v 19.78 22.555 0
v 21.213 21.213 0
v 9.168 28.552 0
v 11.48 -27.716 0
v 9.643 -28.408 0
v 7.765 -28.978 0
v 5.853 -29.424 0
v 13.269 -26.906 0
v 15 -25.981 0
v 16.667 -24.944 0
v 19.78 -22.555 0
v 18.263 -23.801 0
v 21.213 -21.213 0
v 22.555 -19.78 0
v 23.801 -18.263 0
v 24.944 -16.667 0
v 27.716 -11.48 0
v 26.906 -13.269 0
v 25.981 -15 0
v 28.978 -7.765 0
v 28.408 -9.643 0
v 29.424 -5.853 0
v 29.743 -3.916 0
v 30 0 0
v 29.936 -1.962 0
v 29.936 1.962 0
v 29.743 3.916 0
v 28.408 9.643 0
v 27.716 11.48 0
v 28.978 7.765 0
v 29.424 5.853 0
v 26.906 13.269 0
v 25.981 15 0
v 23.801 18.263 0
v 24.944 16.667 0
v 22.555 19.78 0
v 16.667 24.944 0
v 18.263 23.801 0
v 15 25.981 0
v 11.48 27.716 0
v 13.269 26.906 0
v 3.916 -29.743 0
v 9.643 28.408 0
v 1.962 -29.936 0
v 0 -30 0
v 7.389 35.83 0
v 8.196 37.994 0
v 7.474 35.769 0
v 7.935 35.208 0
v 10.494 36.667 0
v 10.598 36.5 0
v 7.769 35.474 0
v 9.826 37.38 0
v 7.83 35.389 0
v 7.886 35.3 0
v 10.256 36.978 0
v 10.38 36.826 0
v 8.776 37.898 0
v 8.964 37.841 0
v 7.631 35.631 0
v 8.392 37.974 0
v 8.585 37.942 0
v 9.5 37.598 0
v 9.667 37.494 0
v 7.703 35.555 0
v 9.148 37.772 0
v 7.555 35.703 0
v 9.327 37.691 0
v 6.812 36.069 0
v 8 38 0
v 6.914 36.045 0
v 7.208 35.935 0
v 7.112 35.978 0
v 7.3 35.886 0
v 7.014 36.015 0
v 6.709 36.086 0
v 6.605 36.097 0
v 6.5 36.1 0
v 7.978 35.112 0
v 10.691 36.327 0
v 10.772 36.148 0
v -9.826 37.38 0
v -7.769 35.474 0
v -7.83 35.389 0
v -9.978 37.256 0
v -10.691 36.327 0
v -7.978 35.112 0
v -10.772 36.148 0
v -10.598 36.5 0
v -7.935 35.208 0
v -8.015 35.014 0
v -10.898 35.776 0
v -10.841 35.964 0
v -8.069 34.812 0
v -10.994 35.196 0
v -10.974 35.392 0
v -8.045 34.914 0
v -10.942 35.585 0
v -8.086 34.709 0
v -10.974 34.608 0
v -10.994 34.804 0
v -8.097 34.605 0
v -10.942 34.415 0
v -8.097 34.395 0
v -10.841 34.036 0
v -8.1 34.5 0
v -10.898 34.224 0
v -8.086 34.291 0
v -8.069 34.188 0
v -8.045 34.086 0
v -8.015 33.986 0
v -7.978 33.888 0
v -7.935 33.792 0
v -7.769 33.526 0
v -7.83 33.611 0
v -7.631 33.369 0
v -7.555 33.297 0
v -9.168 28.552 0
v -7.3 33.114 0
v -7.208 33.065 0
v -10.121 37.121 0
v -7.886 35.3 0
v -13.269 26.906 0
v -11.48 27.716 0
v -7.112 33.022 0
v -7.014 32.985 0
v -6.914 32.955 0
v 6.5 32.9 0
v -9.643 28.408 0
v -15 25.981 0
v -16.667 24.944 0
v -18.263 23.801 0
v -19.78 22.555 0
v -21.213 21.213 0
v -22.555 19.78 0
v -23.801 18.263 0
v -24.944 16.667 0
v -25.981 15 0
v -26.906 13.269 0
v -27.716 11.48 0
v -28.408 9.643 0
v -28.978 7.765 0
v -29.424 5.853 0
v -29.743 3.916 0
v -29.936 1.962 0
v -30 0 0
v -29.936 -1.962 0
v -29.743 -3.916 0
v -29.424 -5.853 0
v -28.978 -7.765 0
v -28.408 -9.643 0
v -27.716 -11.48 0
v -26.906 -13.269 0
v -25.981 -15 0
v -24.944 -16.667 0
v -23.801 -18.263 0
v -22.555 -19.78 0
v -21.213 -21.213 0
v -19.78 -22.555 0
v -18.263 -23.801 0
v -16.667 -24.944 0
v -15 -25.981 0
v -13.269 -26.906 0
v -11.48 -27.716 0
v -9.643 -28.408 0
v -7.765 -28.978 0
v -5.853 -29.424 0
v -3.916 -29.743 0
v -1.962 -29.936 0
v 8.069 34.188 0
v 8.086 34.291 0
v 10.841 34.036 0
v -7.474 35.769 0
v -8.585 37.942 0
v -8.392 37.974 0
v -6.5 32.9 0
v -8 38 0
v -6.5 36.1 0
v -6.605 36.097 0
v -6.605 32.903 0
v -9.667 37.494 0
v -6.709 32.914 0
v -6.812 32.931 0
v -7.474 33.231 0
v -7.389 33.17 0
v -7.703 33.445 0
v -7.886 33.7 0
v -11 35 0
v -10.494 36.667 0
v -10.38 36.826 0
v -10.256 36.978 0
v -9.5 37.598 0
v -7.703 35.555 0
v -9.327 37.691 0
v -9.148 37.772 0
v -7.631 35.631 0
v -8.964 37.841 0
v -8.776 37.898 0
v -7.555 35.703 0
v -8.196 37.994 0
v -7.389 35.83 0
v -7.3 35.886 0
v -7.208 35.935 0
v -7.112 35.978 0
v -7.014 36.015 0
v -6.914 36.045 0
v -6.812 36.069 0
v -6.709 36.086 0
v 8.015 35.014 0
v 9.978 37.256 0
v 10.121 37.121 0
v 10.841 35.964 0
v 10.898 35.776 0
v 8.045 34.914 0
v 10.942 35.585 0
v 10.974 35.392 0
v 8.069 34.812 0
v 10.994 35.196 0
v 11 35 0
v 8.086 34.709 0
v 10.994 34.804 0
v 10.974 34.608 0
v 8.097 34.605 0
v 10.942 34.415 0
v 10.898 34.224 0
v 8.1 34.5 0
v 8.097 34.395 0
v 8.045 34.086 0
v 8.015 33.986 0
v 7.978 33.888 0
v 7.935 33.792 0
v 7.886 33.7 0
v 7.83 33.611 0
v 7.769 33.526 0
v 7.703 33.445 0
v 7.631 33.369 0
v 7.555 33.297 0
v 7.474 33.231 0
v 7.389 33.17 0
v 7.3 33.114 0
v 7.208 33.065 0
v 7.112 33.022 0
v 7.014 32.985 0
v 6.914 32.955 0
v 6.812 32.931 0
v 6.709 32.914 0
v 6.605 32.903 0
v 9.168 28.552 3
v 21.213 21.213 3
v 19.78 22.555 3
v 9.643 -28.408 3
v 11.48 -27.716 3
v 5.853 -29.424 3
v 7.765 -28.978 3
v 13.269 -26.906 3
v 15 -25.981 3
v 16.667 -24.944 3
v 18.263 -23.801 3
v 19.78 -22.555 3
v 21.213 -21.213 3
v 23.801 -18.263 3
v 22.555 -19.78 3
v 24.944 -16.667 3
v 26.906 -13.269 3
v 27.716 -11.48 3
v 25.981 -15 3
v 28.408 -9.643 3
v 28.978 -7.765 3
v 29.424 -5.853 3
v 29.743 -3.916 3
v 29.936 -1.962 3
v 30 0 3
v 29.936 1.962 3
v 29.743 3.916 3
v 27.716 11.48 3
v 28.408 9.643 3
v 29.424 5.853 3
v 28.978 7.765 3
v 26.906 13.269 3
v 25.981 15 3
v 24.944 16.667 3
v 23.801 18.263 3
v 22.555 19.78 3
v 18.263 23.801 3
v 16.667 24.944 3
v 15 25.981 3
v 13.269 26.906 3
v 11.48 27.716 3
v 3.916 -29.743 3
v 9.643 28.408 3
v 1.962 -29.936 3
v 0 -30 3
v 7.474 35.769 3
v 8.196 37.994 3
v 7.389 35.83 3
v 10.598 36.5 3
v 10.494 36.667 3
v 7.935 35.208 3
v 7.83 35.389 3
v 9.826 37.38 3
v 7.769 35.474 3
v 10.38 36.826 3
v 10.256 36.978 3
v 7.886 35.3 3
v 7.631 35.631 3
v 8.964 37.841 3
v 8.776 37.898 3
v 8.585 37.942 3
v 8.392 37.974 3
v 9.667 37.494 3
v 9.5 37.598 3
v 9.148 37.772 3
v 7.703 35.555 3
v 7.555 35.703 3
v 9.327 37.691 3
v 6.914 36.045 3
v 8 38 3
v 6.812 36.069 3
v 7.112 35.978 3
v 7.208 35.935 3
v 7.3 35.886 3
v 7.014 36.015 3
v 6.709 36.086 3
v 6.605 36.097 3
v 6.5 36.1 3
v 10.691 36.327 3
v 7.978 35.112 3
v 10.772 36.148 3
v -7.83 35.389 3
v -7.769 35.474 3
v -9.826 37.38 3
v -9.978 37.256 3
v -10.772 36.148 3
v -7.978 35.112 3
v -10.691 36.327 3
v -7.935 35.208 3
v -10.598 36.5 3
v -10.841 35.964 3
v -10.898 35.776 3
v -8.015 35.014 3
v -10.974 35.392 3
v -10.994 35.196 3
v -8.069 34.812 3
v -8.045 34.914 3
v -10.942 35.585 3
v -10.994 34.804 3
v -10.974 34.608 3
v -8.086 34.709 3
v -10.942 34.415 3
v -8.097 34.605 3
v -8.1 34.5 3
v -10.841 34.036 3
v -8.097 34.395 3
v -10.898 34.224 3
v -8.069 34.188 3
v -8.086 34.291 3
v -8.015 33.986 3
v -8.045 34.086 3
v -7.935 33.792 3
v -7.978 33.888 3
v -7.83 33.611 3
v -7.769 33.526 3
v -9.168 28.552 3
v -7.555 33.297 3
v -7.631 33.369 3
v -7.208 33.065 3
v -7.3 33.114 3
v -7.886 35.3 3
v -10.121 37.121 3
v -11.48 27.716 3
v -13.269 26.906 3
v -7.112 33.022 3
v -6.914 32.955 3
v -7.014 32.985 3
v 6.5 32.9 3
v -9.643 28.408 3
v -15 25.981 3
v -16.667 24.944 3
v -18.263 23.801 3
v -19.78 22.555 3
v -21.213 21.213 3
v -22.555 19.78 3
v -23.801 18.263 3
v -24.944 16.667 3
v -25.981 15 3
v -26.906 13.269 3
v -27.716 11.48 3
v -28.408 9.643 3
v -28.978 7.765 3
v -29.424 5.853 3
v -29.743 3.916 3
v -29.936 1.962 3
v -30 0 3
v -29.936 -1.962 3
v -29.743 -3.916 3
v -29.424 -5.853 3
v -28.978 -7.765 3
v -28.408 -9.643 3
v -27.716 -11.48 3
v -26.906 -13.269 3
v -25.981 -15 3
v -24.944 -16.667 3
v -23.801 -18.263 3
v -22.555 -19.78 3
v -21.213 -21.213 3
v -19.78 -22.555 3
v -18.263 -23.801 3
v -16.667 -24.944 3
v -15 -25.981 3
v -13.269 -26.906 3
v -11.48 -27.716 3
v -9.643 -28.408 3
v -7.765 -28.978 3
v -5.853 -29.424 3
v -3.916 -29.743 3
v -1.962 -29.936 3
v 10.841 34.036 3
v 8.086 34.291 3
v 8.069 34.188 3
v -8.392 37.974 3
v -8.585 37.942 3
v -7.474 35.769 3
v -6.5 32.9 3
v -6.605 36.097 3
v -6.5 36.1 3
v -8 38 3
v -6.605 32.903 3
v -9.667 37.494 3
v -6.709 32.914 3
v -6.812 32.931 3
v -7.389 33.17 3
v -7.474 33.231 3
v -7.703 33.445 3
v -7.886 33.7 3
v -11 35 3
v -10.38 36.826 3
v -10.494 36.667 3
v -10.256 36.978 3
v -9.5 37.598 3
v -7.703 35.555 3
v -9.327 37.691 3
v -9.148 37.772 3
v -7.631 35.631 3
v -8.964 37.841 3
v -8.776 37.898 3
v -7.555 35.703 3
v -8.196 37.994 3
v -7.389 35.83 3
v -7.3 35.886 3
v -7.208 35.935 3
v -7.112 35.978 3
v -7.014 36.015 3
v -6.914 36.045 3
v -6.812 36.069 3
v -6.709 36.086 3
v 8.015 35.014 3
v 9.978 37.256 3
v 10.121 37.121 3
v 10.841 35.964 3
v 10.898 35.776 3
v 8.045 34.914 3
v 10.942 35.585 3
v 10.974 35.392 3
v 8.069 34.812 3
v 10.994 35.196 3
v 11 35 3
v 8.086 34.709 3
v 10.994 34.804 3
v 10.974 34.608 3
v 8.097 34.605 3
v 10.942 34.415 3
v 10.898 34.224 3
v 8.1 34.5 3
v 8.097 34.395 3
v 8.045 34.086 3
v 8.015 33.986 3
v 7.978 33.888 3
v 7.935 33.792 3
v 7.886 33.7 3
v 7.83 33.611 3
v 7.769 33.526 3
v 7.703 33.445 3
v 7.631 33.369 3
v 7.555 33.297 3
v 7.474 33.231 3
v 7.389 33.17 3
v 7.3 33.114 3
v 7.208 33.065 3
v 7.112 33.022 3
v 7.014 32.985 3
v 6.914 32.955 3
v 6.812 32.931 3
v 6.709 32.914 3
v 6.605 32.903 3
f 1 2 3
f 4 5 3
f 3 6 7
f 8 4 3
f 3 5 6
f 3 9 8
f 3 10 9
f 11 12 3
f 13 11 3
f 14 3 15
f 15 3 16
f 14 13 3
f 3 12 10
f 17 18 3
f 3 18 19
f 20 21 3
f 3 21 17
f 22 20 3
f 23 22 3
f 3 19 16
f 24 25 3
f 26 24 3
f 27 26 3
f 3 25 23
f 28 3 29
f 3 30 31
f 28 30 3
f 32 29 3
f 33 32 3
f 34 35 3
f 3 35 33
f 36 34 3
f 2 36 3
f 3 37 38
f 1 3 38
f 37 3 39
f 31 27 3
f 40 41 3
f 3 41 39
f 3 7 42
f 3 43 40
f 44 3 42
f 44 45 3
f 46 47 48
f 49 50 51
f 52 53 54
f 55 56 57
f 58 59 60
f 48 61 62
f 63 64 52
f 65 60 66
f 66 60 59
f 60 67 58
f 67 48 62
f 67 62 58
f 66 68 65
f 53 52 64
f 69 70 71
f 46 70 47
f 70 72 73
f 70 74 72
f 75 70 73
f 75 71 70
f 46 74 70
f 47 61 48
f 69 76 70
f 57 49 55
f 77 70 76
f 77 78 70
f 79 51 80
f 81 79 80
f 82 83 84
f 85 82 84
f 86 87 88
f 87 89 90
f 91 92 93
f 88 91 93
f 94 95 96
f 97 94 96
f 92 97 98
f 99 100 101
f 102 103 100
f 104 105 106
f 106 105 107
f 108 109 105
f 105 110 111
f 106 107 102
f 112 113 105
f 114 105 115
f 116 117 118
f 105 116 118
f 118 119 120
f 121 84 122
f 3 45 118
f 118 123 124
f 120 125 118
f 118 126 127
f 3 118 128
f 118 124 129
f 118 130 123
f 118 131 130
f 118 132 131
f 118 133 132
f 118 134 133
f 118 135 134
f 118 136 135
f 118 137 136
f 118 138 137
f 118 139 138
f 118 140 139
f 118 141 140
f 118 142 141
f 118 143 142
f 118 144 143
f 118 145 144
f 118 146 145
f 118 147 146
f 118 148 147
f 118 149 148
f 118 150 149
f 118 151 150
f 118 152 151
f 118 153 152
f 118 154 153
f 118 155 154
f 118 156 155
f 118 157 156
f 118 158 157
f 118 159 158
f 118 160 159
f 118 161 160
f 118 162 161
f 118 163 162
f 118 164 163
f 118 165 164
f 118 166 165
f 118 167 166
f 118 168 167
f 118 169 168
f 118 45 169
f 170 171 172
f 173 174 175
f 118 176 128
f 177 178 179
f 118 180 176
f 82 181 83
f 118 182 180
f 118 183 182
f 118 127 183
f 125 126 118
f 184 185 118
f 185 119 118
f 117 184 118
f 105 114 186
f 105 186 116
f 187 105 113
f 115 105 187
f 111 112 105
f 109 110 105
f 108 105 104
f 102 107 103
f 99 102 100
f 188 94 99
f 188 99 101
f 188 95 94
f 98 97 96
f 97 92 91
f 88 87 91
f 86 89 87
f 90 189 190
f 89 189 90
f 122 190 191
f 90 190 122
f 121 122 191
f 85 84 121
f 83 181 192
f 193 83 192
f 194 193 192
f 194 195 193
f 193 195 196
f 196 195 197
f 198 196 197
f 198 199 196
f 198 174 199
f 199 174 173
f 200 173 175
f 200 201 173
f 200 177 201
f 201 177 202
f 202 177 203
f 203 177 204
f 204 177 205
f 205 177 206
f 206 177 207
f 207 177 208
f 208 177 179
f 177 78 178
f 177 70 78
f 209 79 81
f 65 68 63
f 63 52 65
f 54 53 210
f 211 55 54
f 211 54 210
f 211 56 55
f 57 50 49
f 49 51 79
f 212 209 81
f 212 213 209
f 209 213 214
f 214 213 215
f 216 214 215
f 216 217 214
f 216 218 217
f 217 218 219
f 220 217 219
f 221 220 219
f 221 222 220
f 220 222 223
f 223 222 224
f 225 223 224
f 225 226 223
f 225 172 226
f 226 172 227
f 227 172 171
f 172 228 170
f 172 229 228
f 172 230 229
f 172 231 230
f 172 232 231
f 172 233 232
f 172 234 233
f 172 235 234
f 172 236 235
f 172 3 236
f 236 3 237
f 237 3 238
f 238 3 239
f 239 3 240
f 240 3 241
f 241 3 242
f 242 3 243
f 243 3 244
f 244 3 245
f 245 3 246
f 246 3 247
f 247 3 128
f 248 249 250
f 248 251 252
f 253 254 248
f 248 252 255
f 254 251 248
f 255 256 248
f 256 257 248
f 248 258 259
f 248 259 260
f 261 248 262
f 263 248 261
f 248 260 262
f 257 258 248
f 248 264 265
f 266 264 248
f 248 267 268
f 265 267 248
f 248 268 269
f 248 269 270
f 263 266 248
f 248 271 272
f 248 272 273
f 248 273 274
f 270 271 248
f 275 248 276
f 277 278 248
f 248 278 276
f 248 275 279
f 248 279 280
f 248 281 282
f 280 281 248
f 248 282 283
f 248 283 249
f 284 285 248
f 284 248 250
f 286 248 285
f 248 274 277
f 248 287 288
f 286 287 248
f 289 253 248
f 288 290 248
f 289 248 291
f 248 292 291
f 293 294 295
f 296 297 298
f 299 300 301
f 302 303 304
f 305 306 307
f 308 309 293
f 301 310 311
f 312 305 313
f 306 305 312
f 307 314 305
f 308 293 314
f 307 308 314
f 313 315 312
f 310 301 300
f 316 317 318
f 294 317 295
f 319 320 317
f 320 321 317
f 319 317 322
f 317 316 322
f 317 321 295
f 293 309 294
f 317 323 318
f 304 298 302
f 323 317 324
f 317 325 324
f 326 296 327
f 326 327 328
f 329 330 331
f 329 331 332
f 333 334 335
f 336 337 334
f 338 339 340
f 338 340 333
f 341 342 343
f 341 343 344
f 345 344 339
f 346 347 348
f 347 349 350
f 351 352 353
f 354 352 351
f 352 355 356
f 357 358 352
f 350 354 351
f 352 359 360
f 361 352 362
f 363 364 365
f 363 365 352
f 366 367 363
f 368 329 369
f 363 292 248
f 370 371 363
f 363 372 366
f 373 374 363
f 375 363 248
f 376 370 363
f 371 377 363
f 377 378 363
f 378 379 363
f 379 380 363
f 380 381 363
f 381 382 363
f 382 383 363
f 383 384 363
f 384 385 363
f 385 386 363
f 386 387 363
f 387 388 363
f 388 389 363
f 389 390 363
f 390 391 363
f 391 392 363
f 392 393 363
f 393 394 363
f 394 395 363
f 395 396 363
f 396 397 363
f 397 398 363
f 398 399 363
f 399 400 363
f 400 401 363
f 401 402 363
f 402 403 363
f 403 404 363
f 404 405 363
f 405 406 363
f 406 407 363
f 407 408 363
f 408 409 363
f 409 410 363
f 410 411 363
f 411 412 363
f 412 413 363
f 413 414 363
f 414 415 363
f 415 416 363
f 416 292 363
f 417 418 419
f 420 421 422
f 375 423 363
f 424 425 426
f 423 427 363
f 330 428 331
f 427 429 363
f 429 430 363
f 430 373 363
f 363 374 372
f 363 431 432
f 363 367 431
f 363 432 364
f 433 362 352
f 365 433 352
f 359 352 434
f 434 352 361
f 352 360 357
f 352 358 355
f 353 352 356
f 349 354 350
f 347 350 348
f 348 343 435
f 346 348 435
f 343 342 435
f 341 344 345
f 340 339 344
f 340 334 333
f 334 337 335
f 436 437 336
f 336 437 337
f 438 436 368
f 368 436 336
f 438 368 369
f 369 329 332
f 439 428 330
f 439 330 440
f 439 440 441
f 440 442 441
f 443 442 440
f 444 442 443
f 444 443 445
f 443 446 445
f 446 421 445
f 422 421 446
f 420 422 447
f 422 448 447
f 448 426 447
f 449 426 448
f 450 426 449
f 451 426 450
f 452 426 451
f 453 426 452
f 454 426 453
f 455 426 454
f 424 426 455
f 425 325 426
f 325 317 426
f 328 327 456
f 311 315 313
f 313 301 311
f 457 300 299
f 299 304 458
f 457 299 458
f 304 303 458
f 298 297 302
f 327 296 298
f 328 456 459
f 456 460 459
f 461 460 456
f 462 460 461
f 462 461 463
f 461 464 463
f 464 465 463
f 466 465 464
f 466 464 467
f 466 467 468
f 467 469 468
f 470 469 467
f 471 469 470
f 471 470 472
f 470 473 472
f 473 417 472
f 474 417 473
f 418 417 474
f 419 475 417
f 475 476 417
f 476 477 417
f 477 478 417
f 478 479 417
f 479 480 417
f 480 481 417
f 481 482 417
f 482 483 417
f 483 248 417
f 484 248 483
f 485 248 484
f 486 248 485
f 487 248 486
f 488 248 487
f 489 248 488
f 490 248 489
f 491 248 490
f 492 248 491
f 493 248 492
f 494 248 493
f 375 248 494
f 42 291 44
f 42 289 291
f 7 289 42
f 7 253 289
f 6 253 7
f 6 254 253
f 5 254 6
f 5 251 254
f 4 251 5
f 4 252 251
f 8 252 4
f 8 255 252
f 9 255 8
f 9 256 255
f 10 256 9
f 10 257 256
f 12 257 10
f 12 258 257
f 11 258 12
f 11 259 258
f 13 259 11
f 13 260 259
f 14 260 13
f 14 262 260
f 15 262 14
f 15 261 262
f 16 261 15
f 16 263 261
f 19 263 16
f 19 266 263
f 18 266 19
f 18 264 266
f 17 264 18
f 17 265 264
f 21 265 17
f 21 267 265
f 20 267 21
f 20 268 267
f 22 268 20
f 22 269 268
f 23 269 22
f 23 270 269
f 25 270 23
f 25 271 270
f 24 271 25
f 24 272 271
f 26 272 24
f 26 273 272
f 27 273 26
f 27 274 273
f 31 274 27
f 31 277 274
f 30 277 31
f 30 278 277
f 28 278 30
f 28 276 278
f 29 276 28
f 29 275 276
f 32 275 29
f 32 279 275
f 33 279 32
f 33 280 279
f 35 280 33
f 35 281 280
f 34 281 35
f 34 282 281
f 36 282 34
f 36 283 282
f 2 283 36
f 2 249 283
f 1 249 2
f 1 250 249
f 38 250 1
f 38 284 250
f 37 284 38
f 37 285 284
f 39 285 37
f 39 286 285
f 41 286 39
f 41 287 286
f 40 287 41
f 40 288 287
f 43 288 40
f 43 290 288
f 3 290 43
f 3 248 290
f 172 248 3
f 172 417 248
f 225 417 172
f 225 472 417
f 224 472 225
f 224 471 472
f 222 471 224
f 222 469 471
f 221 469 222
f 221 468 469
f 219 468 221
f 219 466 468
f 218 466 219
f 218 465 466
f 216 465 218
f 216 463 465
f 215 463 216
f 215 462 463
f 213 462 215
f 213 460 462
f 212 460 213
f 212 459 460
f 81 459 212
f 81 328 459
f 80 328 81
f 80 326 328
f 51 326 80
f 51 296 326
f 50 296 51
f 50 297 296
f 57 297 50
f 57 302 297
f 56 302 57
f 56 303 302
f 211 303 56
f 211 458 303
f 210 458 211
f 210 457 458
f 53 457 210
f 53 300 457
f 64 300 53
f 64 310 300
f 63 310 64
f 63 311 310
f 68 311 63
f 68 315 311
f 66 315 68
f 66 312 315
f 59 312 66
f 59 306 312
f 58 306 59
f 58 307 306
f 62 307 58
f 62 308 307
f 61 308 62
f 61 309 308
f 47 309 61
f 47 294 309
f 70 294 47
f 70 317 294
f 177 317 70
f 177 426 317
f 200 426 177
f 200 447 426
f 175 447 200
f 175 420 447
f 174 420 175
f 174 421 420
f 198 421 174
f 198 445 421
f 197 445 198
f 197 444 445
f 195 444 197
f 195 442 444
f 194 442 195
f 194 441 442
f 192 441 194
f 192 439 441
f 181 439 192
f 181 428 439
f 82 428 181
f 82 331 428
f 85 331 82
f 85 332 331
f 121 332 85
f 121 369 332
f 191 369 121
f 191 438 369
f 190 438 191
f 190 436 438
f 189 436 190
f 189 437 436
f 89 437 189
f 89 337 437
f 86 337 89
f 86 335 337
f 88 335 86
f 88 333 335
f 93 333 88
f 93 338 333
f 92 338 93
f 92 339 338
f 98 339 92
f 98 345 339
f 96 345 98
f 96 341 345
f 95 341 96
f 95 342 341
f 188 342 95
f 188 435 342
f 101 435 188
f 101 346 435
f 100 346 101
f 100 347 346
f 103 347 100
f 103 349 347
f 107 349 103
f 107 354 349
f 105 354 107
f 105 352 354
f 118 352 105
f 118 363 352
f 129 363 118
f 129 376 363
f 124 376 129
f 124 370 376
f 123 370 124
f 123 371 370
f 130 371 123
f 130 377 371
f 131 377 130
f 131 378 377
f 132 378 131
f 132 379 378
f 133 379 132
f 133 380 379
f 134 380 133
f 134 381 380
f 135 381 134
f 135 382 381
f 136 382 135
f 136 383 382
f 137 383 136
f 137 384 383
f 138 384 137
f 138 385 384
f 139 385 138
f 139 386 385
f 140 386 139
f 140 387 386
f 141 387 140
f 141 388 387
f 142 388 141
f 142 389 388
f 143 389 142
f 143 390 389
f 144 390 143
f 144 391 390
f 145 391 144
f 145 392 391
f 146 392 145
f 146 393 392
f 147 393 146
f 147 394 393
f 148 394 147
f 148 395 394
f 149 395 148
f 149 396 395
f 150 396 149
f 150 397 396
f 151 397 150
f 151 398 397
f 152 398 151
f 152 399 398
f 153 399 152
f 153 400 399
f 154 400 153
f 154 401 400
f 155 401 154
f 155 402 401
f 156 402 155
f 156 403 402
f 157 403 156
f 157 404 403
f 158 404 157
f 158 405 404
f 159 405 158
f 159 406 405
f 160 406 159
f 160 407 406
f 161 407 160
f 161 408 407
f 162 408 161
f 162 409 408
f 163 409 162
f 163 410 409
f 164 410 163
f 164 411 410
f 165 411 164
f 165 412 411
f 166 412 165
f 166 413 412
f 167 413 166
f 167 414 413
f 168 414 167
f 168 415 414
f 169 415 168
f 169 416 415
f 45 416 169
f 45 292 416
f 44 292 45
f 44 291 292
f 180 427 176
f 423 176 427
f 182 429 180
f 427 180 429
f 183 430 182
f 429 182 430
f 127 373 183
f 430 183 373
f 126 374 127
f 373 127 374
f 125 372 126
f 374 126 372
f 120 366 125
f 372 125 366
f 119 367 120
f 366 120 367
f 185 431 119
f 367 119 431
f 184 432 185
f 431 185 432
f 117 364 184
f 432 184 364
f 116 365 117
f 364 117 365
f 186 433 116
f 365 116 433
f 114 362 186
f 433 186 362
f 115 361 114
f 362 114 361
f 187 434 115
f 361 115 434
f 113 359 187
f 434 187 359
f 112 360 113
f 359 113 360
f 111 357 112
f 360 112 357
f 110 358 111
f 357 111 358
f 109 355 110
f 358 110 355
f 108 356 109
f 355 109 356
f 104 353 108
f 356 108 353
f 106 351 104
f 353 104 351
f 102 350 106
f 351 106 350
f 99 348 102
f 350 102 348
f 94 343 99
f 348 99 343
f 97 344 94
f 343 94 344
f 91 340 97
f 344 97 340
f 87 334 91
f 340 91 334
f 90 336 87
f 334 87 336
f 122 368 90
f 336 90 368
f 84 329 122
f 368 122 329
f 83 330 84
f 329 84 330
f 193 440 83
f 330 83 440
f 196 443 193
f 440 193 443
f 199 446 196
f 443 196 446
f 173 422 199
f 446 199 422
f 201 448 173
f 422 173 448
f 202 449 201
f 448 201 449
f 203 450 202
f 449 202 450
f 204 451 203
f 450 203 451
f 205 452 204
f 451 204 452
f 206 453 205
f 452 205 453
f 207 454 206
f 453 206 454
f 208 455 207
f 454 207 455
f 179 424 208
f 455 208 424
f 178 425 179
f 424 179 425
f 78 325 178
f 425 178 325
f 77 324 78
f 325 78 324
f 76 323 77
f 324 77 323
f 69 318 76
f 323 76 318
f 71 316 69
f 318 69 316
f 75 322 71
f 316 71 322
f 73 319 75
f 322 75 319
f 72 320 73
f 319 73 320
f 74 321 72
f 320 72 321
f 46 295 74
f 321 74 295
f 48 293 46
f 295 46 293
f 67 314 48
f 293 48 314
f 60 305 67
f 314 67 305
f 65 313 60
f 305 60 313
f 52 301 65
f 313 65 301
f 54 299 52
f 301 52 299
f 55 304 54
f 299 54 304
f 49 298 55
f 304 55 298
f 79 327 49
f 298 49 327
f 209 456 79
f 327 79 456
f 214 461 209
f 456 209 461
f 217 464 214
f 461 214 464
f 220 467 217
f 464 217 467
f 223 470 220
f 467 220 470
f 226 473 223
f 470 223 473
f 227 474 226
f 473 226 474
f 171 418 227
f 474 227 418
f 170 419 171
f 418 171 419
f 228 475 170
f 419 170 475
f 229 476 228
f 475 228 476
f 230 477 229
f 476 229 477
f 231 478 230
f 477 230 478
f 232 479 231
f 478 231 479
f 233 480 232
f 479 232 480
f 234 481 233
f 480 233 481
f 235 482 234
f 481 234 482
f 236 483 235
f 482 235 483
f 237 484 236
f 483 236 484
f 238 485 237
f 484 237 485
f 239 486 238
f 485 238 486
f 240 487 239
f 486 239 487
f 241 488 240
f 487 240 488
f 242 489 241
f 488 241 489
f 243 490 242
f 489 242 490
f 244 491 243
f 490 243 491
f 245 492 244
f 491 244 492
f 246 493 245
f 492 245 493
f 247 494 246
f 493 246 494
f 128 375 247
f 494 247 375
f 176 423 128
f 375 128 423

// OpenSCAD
// Medalha — modelo próprio do Multiferramenta 3D
// Partes: "medalha" (disco + passador da fita) e "relevo" (borda, emblema e textos — outra cor)
texto = "CAMPEÃO"; linha2 = "2026"; fonte = "Poppins:style=Bold";
centro = "estrela";     // estrela | logo | nenhum
logo = []; lw = 30; lh = 30;
diametro = 60; esp = 3; relevo = 1.2; borda = 2.5; fita = "rasgo";   // rasgo | argola
parte = "medalha";
$fn = 96;

R = diametro / 2;
module estrela(r) polygon([for (i = [0 : 9]) let(a = 90 + i * 36, rr = i % 2 == 0 ? r : r * 0.42) [rr * cos(a), rr * sin(a)]]);
module emblema() translate([0, R * 0.22]) {
  if (centro == "estrela") estrela(R * 0.36);
  else if (centro == "logo") resize([0, R * 0.62], auto = true) for (p = logo) polygon(points = p[0], paths = p[1]);
}
tem_emb = centro != "nenhum";
module textos() {
  y1 = tem_emb ? -R * 0.28 : R * 0.08;
  translate([0, y1]) resize([min(diametro * 0.72, len(texto) * diametro * 0.085), 0], auto = true) text(texto, font = fonte, size = 10, halign = "center", valign = "center");
  if (len(linha2) > 0) translate([0, y1 - R * 0.3]) resize([0, R * 0.2], auto = true) text(linha2, font = fonte, size = 10, halign = "center", valign = "center");
}
module passador() {
  if (fita == "rasgo") difference() { hull() { translate([-9, R - 2]) square([18, 1]); translate([-8, R + 5]) circle(r = 3); translate([8, R + 5]) circle(r = 3); }
    hull() { translate([-6.5, R + 4.5]) circle(r = 1.6); translate([6.5, R + 4.5]) circle(r = 1.6); } }
  else difference() { hull() { translate([0, R + 3]) circle(r = 5); translate([-3, R - 2]) square([6, 1]); } translate([0, R + 3]) circle(r = 2.5); }
}
if (parte == "medalha") linear_extrude(esp) union() { circle(r = R); passador(); }
else if (parte == "relevo") translate([0, 0, esp]) linear_extrude(relevo) {
  difference() { circle(r = R); circle(r = R - borda); }
  emblema(); textos();
}
